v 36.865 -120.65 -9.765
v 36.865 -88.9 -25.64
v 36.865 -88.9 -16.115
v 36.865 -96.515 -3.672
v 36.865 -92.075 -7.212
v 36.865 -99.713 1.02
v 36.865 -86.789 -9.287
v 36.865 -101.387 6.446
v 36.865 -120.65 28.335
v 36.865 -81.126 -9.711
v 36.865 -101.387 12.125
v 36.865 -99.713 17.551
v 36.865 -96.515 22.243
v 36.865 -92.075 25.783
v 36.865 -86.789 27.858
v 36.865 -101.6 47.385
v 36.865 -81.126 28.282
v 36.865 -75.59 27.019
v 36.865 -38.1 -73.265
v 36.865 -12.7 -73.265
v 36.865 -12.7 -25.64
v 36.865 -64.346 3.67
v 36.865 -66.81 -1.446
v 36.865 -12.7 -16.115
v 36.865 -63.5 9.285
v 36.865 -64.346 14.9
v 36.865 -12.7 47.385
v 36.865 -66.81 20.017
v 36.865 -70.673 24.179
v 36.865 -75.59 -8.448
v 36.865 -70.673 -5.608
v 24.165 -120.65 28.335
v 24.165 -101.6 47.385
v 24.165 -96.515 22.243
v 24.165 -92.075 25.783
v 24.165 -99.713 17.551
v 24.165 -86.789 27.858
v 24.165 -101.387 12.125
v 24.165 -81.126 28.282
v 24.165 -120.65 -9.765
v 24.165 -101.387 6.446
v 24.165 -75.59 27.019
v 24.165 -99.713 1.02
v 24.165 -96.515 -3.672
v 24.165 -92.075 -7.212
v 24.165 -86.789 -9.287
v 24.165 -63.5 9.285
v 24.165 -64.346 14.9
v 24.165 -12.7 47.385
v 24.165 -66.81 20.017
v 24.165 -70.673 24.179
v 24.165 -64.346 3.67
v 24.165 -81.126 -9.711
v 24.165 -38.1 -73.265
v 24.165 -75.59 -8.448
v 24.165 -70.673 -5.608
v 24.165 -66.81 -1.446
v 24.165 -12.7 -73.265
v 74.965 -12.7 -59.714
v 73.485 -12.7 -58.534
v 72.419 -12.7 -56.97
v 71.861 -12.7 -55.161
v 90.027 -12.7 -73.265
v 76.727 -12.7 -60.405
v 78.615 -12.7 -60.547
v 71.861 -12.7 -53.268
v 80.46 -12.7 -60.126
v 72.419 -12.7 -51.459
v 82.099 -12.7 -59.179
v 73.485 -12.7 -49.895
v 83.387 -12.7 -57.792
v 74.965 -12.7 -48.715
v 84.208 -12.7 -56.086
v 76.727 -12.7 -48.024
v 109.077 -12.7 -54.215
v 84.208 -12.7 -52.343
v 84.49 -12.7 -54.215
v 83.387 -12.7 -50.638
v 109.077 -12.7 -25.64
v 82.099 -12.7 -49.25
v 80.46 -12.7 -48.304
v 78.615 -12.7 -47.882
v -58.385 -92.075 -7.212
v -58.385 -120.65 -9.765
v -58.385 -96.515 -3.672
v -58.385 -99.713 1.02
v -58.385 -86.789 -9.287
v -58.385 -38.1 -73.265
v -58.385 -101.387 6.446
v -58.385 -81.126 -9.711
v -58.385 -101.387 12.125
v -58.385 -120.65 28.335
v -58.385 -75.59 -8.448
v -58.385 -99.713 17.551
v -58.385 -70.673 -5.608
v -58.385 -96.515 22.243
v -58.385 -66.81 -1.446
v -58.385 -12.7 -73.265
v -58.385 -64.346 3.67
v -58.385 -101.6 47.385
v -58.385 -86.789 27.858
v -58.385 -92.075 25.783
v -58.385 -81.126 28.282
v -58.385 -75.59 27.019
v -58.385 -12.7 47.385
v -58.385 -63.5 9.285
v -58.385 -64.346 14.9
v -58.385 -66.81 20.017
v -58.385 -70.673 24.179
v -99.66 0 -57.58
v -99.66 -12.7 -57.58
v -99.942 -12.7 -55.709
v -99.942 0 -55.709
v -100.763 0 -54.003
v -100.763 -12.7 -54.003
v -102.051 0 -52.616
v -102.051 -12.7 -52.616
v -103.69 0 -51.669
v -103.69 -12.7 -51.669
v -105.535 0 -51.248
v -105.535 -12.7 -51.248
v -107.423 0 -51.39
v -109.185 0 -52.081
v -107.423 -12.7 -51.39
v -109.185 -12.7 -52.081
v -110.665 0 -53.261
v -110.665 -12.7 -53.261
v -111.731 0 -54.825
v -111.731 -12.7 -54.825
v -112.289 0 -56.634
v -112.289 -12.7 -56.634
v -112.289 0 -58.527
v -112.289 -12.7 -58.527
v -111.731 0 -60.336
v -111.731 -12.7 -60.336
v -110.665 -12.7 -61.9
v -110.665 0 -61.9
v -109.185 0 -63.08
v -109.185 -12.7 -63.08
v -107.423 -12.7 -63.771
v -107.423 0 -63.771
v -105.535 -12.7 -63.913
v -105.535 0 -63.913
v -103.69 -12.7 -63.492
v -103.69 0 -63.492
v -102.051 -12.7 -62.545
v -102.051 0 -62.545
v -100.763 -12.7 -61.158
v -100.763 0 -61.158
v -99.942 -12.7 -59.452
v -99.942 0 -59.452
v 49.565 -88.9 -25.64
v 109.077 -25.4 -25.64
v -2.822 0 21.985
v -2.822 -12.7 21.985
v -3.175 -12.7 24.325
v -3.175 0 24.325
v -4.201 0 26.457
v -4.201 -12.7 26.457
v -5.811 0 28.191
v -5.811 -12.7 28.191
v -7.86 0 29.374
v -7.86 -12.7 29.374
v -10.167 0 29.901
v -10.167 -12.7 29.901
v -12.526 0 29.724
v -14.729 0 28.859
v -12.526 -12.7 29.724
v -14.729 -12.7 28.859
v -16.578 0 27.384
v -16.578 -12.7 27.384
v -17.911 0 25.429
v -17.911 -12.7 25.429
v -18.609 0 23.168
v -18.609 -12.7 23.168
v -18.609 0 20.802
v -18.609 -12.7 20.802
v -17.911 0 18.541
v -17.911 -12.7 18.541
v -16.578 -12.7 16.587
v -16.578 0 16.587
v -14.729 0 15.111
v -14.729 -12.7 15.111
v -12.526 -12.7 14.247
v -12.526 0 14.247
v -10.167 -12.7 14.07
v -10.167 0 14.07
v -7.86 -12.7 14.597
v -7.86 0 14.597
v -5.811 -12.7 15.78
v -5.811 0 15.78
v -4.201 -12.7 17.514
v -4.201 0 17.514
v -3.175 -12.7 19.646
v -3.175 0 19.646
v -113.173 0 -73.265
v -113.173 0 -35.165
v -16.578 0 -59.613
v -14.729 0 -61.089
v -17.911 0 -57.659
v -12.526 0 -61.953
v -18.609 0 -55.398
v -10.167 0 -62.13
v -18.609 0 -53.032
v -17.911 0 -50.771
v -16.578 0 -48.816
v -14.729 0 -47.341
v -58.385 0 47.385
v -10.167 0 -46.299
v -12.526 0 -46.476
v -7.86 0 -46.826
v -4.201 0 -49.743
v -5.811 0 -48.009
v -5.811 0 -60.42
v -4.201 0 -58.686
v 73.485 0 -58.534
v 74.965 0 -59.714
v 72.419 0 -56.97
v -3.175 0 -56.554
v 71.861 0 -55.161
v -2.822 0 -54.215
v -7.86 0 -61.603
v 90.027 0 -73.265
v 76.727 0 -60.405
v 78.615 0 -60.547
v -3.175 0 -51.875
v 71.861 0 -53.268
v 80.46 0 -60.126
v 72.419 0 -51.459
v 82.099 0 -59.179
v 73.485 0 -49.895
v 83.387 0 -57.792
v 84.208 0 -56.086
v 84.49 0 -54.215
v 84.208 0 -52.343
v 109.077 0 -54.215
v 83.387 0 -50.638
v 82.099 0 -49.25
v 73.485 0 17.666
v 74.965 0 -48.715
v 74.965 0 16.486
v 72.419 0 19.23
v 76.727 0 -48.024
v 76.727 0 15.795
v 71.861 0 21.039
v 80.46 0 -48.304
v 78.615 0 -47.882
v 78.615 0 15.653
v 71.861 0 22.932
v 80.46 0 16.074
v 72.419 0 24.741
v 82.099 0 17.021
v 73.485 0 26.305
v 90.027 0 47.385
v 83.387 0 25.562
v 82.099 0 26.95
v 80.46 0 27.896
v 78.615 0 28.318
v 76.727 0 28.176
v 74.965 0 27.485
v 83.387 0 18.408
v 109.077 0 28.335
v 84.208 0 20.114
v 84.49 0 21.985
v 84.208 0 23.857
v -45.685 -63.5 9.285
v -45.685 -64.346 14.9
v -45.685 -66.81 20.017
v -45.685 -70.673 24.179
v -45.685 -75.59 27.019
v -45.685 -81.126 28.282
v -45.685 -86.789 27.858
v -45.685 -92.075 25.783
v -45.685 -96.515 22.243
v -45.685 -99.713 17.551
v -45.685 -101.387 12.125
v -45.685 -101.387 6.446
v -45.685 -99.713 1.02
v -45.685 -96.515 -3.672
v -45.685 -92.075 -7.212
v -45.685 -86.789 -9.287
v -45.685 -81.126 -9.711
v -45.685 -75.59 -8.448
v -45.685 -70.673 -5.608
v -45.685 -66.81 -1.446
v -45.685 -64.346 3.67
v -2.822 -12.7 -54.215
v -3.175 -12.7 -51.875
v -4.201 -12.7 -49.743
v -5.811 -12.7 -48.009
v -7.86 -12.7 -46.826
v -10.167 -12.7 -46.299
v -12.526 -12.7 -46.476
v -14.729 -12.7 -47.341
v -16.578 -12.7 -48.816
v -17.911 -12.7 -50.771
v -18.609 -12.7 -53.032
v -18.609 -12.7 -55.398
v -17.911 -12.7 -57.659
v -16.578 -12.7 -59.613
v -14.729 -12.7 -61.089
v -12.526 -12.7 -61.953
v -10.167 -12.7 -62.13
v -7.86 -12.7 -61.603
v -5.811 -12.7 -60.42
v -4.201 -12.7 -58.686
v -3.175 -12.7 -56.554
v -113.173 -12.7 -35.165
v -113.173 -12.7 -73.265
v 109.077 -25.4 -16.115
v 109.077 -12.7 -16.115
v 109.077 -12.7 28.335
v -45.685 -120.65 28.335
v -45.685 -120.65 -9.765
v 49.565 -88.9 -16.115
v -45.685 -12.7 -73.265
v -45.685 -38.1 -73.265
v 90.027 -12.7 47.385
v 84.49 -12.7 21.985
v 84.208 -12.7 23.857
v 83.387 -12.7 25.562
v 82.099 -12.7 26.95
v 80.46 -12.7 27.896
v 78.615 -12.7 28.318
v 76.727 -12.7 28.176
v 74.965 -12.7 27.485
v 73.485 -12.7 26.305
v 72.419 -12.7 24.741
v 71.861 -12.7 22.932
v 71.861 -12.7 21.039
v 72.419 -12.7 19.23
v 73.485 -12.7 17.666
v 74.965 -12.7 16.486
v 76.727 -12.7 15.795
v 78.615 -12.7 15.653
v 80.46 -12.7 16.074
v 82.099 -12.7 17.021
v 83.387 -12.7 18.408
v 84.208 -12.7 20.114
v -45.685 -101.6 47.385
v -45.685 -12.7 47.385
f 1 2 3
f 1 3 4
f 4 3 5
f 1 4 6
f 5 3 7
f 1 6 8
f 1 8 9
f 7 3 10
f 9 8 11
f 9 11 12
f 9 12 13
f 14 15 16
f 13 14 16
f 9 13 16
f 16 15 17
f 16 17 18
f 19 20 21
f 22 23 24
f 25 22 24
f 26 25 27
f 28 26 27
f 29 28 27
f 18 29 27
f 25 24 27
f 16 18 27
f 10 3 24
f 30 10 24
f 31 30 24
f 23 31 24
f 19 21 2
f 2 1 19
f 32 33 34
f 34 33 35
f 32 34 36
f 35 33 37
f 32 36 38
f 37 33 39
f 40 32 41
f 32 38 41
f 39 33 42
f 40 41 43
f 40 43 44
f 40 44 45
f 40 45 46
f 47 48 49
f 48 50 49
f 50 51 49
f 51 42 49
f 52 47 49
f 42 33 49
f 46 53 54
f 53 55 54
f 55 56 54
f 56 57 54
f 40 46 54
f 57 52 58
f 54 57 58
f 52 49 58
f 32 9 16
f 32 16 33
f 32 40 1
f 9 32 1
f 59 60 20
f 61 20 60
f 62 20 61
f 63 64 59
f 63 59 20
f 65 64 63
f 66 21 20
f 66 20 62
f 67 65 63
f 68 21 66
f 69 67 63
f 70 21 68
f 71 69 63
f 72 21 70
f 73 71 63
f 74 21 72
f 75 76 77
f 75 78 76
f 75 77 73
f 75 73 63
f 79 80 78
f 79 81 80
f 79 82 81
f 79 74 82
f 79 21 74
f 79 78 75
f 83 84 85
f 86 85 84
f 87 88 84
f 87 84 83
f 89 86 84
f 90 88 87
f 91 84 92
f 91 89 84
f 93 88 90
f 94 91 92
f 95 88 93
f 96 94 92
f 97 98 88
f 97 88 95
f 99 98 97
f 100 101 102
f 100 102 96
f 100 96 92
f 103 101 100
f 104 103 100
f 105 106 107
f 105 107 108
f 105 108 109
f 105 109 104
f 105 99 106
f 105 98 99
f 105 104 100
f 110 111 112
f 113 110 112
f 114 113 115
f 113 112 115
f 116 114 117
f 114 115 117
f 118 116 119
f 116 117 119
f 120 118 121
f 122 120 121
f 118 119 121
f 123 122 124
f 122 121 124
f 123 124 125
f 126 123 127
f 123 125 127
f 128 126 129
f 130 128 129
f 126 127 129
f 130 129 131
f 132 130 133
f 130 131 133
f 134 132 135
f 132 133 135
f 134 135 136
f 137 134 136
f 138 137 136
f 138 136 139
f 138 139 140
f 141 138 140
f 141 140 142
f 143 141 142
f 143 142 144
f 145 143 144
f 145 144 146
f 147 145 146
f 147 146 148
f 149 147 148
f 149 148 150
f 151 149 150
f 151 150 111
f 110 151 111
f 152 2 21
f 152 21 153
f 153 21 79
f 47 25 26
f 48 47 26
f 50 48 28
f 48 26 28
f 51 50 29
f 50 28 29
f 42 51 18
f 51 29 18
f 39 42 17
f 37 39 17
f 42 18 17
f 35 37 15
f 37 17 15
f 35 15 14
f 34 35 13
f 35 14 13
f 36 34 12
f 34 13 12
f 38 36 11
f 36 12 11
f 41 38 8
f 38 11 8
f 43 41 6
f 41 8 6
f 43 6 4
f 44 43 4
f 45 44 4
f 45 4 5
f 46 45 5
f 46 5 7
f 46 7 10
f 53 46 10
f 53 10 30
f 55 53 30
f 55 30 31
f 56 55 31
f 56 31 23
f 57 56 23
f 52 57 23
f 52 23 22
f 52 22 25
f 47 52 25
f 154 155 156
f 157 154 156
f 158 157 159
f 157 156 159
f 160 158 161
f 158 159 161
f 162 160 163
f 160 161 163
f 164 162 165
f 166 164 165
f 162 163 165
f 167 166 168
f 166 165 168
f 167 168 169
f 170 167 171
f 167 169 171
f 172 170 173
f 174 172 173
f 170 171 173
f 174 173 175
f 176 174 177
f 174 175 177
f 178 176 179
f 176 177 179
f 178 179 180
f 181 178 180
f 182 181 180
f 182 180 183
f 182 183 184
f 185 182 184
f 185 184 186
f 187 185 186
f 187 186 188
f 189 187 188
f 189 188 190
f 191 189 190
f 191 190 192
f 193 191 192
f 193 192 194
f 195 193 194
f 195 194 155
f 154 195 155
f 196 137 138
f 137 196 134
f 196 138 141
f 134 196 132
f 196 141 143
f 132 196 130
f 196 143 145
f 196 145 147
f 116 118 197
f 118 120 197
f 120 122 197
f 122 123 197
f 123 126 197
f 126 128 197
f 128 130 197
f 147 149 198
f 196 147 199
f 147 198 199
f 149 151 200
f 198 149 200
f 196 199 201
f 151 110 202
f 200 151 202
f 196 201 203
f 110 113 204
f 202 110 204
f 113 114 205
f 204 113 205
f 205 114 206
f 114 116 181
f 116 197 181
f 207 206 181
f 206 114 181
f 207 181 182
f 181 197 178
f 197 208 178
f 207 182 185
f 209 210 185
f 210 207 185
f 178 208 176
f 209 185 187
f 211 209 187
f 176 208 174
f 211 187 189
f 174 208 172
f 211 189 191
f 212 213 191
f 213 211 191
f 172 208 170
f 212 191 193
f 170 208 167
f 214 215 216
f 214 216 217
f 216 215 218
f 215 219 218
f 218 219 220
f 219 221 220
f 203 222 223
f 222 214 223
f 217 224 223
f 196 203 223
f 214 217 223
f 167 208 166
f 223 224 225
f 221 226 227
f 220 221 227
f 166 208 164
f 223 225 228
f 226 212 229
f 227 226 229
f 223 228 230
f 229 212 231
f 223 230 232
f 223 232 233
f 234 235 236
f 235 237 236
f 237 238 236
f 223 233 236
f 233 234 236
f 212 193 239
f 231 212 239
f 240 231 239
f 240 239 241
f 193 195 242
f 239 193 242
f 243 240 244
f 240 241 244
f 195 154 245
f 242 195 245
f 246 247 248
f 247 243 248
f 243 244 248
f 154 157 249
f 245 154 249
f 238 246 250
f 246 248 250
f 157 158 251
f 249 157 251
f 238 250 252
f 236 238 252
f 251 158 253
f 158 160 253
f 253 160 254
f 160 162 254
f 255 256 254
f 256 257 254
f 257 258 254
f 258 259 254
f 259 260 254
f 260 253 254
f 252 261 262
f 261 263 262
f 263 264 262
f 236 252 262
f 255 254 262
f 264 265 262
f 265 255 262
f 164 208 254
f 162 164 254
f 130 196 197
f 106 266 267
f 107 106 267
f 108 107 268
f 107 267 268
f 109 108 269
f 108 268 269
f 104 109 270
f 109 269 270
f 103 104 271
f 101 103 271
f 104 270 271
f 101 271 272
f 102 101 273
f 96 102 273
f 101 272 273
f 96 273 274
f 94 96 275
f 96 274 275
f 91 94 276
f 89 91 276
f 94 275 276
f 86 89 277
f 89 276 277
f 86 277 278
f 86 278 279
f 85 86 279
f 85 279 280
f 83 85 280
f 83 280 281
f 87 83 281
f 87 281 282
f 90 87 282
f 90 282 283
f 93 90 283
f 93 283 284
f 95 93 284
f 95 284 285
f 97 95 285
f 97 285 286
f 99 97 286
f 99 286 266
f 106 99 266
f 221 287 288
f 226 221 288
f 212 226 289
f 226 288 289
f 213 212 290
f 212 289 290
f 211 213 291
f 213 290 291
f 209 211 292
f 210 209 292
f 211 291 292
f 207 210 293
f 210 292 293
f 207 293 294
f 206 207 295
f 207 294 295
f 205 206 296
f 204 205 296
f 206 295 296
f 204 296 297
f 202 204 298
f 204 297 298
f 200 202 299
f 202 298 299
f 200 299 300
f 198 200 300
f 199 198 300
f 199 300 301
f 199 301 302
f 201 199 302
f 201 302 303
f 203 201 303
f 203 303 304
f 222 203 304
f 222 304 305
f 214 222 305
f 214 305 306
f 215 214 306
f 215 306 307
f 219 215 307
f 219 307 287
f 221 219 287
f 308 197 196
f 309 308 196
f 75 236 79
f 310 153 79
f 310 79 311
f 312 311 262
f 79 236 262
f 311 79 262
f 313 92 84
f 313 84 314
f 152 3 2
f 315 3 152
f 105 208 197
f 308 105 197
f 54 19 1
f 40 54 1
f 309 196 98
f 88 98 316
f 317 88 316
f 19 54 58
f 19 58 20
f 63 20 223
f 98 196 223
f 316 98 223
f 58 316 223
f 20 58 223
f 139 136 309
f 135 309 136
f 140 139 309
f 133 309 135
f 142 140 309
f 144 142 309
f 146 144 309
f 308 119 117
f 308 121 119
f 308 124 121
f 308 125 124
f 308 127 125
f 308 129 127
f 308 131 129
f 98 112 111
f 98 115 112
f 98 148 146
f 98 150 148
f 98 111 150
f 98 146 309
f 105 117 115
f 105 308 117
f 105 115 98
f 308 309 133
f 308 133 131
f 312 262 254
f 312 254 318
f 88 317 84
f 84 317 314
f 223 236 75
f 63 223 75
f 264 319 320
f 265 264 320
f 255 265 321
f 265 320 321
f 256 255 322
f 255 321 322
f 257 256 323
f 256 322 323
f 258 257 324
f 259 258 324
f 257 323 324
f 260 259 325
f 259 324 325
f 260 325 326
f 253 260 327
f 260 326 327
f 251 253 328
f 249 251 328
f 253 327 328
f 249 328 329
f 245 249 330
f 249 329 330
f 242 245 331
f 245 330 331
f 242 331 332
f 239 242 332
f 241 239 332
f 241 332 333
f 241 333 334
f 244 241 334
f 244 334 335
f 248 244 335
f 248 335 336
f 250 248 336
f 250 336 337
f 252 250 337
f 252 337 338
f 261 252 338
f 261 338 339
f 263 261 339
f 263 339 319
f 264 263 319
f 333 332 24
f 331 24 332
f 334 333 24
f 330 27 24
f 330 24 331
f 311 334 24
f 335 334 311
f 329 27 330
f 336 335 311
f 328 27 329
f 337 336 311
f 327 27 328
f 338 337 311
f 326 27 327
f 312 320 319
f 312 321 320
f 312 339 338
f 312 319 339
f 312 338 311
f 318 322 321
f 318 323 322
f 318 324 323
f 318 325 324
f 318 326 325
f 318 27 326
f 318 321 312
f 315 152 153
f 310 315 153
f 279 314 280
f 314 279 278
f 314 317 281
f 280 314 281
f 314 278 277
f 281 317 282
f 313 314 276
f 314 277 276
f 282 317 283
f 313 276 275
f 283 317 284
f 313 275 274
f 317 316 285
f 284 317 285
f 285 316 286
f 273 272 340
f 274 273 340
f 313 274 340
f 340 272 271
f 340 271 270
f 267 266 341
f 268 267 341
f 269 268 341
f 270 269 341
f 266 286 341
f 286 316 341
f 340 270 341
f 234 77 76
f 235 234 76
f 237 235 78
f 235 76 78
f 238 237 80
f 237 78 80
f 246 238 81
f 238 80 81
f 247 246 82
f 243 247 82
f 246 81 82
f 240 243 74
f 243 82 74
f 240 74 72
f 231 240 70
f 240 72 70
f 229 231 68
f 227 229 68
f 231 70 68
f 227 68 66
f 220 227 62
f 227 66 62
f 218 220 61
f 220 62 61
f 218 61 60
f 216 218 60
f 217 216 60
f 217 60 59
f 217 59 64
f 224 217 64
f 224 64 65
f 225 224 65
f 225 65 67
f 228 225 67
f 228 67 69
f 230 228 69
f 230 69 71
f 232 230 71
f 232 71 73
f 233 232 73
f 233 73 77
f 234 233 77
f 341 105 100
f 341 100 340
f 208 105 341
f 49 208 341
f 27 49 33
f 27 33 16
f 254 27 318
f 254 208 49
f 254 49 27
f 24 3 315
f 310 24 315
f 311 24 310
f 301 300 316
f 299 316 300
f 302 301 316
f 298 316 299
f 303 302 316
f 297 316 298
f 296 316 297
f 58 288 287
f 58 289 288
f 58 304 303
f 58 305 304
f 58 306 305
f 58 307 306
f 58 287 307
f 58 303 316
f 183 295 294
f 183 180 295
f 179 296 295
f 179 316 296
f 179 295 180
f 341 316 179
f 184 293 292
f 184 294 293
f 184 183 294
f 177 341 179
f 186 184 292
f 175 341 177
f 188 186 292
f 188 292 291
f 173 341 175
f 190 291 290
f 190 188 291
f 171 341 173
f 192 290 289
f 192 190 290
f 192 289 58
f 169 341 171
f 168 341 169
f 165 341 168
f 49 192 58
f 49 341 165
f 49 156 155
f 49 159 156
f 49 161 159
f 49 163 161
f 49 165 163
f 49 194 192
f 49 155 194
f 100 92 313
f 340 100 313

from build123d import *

# Parameters (mm, degrees)
F1_DEPTH  = 12.7
F2_SIZE   = 19.05
F3_R      = 7.9375
F3_R_2    = 6.35
F4_DEPTH  = 74.422
F3_W      = 12.7
F3_H      = 120.65
F5_DEPTH  = 107.95
F6_SIZE   = 19.05
F7_R      = 19.05
F8_DEPTH  = 399.034
F3_W_2    = 72.2113
F3_H_2    = 9.525
F9_DEPTH  = 76.2
F11_DEPTH = 180.848


with BuildPart() as f1:
    # F0 (on Front) → F1 (new body)
    with BuildSketch(Plane.XZ):
        Polygon((109.076549, 47.385406), (-58.384751, 47.385406), (-113.173451, -35.164594), (-113.173451, -73.264594), (109.076549, -73.264594), align=None)
    extrude(amount=F1_DEPTH)

    # F2
    f2_edges = [f1.edges().sort_by_distance(p)[0] for p in [
        (109.076549, -6.35, -73.264594),
        (109.076549, -6.35, 47.385406),
    ]]
    chamfer(f2_edges, length=F2_SIZE)

    # F3 (on face) → F4 (cut)
    with BuildSketch(Plane.XZ.offset(12.7)):
        with Locations((-10.759751, 21.985406)):
            Circle(F3_R)
        with Locations((78.140249, 21.985406)):
            Circle(F3_R_2)
        with Locations((78.140249, -54.214594)):
            Circle(F3_R_2)
        with Locations((-106.009751, -57.58049)):
            Circle(F3_R_2)
        with Locations((-10.759751, -54.214594)):
            Circle(F3_R)
    extrude(amount=-F4_DEPTH, mode=Mode.SUBTRACT)

    # F3 (on face) → F5 (join)
    with BuildSketch(Plane.XZ.offset(12.7)):
        with Locations((-52.034751, -12.939594)):
            Rectangle(F3_W, F3_H)
        Polygon((36.865249, 47.385406), (24.165249, 47.385406), (24.165249, -73.264594), (36.865249, -73.264594), (36.865249, -25.639594), (36.865249, -16.114594), align=None)
    extrude(amount=F5_DEPTH)

    # F6
    f6_edges = [f1.edges().sort_by_distance(p)[0] for p in [
        (30.515249, -120.65, 47.385406),
        (-52.034751, -120.65, 47.385406),
    ]]
    chamfer(f6_edges, length=F6_SIZE)

    # F7 (on face) → F8 (cut)
    with BuildSketch(Plane.YZ.offset(36.865249)):
        with Locations((-82.55, 9.285406)):
            Circle(F7_R)
        Polygon((-38.1, -73.264594), (-120.65, -9.764594), (-120.65, -73.264594), align=None)
    extrude(amount=-F8_DEPTH, mode=Mode.SUBTRACT)

    # F3 (on face) → F9 (join)
    with BuildSketch(Plane.XZ.offset(12.7)):
        with Locations((72.970899, -20.877094)):
            Rectangle(F3_W_2, F3_H_2)
    extrude(amount=F9_DEPTH)

    # F10 (on face) → F11 (cut)
    with BuildSketch(Plane(origin=(0, 0, -25.639594), x_dir=(1, 0, 0), z_dir=(0, 0, -1))):
        Polygon((109.076549, 88.9), (49.565249, 88.9), (109.076549, 25.4), align=None)
    extrude(amount=-F11_DEPTH, mode=Mode.SUBTRACT)


solid = f1.part
